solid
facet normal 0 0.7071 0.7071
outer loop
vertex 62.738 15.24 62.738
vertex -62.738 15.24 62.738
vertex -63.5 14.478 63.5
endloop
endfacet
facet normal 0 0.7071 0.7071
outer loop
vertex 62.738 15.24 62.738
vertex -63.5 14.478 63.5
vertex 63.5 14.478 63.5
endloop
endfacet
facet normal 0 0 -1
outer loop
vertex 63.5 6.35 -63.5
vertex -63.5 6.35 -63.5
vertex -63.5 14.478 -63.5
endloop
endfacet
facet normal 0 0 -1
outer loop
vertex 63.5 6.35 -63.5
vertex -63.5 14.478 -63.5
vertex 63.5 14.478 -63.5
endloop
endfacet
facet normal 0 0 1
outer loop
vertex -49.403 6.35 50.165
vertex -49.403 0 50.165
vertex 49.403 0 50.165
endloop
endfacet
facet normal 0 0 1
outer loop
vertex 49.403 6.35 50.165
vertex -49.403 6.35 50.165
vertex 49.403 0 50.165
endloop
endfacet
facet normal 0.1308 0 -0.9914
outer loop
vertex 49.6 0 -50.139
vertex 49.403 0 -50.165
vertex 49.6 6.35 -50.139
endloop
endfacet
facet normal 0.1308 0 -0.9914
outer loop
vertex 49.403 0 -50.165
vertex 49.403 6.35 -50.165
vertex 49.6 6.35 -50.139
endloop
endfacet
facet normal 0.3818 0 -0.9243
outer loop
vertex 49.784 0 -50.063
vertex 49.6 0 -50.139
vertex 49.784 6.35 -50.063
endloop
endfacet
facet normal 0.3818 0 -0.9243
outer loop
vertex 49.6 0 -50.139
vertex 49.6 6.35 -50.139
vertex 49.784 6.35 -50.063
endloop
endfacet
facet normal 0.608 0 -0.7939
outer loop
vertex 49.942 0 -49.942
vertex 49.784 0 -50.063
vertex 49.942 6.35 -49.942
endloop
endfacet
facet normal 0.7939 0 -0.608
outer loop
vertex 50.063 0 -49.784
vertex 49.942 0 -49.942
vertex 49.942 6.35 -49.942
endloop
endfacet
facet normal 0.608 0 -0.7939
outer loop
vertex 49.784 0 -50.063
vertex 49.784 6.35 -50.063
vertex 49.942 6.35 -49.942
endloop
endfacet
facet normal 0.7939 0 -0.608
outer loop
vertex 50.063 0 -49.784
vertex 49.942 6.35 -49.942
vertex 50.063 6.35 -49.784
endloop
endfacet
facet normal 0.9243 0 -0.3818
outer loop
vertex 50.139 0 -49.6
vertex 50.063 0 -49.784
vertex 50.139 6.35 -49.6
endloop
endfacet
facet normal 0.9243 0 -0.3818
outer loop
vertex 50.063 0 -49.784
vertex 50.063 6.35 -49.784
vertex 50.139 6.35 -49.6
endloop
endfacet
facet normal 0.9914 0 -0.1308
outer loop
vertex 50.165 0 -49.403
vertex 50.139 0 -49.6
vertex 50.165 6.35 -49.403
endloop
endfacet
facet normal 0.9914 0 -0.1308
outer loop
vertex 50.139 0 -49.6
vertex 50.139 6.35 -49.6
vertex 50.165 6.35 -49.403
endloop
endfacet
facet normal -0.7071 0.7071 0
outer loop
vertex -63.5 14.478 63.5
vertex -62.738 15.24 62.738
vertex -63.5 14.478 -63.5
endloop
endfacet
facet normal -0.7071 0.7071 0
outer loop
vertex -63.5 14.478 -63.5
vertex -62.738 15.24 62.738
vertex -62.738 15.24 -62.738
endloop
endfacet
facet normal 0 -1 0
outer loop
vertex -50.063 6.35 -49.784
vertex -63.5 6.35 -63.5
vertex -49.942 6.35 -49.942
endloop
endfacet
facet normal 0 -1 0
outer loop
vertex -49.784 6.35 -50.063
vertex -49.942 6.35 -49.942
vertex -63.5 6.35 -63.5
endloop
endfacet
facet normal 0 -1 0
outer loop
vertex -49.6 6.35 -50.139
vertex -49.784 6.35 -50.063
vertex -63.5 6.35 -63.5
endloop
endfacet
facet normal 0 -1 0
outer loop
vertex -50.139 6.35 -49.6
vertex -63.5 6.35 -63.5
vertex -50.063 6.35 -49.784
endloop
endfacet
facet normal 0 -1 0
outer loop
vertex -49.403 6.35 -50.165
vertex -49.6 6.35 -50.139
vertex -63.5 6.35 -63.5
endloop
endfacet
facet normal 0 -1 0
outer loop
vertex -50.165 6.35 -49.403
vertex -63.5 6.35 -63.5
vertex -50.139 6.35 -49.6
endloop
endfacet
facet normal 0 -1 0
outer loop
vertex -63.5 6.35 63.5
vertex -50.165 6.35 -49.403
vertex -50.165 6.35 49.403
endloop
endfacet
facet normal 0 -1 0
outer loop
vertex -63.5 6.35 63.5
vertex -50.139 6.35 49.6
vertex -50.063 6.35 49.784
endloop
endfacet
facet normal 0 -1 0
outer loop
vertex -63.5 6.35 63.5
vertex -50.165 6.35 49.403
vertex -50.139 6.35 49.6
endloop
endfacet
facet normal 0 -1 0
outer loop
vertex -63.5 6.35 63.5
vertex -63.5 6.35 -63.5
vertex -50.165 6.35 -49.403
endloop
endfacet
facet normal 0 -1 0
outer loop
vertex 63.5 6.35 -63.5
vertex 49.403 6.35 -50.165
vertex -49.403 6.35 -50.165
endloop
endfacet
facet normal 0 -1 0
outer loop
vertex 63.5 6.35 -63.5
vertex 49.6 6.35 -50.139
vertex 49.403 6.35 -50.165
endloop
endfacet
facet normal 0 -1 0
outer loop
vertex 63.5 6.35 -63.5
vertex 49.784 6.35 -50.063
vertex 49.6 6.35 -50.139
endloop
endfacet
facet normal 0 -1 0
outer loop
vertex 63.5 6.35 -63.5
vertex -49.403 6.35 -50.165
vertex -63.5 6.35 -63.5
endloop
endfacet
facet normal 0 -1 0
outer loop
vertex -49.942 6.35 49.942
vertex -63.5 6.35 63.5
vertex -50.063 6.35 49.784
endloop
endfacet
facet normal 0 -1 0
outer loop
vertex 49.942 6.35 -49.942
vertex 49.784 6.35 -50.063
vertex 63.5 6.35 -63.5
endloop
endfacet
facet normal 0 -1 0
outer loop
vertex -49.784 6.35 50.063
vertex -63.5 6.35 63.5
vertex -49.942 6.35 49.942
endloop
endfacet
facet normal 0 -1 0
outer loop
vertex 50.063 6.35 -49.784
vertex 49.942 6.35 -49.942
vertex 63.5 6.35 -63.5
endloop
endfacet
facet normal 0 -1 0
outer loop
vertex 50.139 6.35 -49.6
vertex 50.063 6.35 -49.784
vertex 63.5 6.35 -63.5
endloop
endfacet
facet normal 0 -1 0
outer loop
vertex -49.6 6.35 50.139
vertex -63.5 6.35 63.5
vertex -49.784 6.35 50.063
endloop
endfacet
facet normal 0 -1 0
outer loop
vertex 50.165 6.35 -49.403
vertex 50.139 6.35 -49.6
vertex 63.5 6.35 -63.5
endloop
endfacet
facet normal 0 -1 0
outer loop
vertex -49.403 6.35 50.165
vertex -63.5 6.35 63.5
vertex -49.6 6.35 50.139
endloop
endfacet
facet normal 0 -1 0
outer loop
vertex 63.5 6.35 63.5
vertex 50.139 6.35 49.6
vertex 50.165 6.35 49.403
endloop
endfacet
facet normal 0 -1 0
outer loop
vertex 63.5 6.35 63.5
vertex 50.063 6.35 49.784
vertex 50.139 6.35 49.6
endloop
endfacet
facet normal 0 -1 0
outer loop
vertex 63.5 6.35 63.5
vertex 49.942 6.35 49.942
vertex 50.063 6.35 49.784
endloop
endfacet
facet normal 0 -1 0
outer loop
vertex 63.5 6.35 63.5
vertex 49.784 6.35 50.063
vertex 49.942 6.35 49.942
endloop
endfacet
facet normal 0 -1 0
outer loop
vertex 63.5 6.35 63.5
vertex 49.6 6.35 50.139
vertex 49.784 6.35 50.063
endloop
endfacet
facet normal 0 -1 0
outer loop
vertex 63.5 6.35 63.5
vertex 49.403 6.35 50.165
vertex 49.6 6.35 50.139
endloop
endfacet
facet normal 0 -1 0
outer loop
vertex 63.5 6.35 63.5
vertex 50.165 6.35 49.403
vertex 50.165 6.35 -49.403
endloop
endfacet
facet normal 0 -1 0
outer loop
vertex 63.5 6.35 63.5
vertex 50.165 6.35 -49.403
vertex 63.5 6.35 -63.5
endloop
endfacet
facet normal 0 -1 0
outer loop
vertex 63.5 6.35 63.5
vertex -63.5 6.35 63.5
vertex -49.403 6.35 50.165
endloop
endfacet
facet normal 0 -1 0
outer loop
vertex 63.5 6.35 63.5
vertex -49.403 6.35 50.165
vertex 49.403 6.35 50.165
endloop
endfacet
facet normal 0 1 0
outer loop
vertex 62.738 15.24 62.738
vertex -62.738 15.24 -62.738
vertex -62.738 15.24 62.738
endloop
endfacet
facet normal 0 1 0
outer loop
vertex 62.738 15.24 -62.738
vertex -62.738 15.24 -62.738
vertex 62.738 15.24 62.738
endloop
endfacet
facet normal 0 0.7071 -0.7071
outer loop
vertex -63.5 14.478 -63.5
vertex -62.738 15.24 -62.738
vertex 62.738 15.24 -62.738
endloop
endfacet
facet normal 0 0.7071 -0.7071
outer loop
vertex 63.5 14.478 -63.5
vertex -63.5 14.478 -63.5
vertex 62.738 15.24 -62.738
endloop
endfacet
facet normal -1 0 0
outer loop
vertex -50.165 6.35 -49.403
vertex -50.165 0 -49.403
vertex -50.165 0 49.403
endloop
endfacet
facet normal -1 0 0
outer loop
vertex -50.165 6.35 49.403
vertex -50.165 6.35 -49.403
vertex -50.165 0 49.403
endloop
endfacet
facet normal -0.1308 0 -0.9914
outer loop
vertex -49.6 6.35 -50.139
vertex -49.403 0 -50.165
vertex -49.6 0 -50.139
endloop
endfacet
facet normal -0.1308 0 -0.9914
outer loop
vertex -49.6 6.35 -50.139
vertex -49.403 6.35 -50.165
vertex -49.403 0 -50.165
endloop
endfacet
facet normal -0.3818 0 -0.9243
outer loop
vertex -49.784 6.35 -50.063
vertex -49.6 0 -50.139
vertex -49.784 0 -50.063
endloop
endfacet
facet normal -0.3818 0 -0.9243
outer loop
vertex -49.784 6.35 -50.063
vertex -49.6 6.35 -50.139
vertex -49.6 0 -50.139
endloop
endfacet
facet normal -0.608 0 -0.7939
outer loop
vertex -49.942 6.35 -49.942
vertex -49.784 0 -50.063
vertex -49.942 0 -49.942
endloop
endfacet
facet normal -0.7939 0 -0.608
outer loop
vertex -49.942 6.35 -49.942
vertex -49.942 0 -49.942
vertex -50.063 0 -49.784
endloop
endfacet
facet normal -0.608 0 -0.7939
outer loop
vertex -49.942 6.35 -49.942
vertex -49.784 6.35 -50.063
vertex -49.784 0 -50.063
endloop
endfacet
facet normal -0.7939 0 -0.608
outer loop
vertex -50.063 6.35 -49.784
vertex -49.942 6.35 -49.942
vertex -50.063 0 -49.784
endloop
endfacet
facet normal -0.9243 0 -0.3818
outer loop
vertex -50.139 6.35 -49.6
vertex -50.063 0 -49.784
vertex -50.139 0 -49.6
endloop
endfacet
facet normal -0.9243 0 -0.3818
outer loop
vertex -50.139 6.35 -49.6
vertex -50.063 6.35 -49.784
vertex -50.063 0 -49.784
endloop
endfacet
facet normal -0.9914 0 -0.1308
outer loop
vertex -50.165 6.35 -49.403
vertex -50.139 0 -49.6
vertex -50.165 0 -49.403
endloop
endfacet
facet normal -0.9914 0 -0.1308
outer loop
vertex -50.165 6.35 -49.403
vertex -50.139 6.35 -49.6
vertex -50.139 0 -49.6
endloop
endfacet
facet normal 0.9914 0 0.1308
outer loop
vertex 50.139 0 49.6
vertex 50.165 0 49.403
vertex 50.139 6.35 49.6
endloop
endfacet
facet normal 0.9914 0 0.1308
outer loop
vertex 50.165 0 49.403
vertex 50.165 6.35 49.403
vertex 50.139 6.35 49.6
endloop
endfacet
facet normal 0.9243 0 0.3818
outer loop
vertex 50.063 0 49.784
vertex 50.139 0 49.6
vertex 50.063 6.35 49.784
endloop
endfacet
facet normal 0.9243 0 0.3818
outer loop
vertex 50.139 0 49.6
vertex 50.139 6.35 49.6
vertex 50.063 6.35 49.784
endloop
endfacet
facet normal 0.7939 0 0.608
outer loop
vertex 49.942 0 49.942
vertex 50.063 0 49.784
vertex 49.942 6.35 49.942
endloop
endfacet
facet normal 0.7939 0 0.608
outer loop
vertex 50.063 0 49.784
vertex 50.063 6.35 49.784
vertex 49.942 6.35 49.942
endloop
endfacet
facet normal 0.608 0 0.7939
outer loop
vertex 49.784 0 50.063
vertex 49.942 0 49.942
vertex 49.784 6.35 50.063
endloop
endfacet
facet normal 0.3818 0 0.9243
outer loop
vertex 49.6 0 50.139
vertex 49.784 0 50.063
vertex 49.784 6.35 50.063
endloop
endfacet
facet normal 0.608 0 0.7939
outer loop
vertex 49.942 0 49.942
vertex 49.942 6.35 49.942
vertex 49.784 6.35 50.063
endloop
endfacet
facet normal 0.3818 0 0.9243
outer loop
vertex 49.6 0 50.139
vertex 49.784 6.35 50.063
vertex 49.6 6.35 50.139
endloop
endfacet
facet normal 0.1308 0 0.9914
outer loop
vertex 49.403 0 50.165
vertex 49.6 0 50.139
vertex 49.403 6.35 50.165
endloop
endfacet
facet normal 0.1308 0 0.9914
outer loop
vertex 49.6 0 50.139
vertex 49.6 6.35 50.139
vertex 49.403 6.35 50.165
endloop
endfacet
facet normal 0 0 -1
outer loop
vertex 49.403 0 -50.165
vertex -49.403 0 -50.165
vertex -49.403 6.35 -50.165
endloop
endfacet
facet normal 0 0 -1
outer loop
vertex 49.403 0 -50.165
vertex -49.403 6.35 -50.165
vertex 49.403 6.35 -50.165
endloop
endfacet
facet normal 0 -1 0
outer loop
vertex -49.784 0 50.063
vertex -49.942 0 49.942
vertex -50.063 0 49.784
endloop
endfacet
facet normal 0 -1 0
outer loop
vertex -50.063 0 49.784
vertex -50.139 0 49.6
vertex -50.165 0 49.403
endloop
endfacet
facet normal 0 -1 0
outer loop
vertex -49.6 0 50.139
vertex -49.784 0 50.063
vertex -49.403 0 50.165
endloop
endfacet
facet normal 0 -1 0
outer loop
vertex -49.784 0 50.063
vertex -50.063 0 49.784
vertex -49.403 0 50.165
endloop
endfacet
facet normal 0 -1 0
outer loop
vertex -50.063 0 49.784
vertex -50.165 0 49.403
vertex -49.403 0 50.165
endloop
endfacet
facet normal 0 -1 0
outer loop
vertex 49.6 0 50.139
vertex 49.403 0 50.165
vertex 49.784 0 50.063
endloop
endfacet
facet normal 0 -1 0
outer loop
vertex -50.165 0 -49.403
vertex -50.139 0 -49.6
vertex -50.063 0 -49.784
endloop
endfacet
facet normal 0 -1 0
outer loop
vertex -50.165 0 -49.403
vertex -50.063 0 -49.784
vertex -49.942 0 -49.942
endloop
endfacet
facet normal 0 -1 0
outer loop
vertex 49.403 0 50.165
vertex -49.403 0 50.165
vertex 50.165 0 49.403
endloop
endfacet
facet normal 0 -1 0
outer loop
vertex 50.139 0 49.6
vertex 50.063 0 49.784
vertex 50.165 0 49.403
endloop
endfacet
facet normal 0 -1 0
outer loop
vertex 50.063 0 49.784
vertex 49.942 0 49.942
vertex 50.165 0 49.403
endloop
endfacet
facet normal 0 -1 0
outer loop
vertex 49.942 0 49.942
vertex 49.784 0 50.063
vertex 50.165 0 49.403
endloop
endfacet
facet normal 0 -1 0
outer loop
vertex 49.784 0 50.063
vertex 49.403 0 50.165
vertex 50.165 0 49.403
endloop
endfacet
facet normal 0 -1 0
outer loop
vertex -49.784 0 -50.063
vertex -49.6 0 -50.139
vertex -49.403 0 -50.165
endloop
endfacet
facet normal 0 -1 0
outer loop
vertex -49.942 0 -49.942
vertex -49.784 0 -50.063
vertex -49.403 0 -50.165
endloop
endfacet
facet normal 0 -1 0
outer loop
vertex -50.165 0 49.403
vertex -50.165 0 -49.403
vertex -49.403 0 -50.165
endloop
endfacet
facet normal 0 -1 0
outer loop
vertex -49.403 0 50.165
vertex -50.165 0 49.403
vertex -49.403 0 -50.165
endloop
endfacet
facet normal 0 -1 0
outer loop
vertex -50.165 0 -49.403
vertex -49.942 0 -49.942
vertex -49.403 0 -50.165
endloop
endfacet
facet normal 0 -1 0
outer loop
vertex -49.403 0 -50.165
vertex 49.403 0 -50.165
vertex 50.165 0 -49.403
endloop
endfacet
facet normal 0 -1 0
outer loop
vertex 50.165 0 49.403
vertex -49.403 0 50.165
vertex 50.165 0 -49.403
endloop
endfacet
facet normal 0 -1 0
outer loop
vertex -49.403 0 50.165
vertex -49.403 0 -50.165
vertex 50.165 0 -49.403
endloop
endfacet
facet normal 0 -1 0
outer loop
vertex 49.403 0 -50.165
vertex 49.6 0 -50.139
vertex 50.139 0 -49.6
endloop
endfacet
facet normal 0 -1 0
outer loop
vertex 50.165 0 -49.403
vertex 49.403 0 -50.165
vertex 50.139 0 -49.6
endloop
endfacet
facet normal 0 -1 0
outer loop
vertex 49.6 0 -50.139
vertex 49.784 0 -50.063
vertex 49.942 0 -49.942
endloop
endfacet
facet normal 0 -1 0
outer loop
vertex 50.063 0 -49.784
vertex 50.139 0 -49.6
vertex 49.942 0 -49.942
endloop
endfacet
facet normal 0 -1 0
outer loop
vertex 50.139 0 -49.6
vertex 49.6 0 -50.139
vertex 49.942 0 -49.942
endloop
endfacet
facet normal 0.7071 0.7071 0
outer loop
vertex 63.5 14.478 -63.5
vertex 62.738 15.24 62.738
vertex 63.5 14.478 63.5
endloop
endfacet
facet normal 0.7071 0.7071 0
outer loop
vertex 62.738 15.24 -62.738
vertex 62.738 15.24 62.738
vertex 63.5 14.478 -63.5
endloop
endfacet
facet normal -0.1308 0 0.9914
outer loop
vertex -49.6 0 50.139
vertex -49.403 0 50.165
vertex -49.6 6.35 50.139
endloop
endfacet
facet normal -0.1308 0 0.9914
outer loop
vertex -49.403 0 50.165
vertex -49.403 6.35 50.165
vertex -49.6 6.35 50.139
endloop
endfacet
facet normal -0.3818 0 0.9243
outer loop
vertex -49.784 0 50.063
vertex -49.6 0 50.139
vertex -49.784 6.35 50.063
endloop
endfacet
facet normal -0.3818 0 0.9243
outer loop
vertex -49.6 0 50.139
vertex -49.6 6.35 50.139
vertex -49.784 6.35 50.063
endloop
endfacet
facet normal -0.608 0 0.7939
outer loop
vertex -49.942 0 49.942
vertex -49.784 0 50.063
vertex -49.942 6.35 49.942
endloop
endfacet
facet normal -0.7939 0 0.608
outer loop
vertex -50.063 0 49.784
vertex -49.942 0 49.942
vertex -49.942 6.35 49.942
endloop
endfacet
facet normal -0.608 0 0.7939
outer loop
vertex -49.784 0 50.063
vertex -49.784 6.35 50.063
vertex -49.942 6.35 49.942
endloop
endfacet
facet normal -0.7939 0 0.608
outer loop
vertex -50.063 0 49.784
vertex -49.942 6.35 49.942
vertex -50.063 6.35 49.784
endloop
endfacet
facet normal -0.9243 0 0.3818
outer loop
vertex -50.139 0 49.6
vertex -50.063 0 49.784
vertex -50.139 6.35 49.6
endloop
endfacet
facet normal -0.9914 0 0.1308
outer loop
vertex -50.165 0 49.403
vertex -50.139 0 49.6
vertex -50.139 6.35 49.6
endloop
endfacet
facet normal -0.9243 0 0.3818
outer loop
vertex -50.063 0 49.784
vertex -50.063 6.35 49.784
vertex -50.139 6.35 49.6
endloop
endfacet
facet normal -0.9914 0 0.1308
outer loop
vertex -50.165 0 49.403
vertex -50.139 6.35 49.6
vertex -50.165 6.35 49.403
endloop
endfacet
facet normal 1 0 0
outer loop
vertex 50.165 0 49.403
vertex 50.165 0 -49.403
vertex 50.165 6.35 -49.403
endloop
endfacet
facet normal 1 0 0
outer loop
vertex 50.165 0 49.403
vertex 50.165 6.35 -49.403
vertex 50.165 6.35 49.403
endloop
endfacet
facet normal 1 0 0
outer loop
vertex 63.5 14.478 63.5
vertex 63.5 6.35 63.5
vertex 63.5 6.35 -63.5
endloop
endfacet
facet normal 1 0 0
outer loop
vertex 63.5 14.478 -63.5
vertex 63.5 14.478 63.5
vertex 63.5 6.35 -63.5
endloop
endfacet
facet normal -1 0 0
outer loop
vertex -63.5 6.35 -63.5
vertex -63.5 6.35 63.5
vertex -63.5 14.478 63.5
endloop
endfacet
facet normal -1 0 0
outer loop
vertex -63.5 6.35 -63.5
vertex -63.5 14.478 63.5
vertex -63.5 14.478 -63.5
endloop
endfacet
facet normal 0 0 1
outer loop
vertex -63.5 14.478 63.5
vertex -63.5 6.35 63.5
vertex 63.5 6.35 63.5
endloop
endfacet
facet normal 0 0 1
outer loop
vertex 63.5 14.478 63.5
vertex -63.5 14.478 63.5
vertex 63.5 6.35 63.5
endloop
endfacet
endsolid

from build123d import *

# Parameters (mm, degrees)
SKETCH1_W           = 127
SKETCH1_H           = 127
BOSS_EXTRUDE1_DEPTH = 15.24
SKETCH2_W           = 127
SKETCH2_H           = 127
SKETCH2_W_2         = 100.33
SKETCH2_H_2         = 100.33
CUT_EXTRUDE1_DEPTH  = 6.35
FILLET1_R           = 0.762
CHAMFER1_SIZE       = 0.762


with BuildPart() as part:
    # Sketch1 → Boss-Extrude1 (new body)
    with BuildSketch(Plane(origin=(0, 0, 0), x_dir=(1, 0, 0), z_dir=(0, 1, 0))):
        Rectangle(SKETCH1_W, SKETCH1_H)
    extrude(amount=BOSS_EXTRUDE1_DEPTH)

    # Sketch2 → Cut-Extrude1 (cut)
    with BuildSketch(Plane.XZ):
        Rectangle(SKETCH2_W, SKETCH2_H)
        Rectangle(SKETCH2_W_2, SKETCH2_H_2, mode=Mode.SUBTRACT)
    extrude(amount=-CUT_EXTRUDE1_DEPTH, mode=Mode.SUBTRACT)

    # Fillet1
    fillet1_edges = [part.edges().sort_by_distance(p)[0] for p in [
        (-50.165, 3.175, -50.165),
        (-50.165, 3.175, 50.165),
        (50.165, 3.175, 50.165),
        (50.165, 3.175, -50.165),
    ]]
    fillet(fillet1_edges, radius=FILLET1_R)

    # Chamfer1
    chamfer1_edges = [part.edges().sort_by_distance(p)[0] for p in [
        (-63.5, 15.24, 0),
        (0, 15.24, 63.5),
        (63.5, 15.24, 0),
        (0, 15.24, -63.5),
    ]]
    chamfer(chamfer1_edges, length=CHAMFER1_SIZE)


solid = part.part
